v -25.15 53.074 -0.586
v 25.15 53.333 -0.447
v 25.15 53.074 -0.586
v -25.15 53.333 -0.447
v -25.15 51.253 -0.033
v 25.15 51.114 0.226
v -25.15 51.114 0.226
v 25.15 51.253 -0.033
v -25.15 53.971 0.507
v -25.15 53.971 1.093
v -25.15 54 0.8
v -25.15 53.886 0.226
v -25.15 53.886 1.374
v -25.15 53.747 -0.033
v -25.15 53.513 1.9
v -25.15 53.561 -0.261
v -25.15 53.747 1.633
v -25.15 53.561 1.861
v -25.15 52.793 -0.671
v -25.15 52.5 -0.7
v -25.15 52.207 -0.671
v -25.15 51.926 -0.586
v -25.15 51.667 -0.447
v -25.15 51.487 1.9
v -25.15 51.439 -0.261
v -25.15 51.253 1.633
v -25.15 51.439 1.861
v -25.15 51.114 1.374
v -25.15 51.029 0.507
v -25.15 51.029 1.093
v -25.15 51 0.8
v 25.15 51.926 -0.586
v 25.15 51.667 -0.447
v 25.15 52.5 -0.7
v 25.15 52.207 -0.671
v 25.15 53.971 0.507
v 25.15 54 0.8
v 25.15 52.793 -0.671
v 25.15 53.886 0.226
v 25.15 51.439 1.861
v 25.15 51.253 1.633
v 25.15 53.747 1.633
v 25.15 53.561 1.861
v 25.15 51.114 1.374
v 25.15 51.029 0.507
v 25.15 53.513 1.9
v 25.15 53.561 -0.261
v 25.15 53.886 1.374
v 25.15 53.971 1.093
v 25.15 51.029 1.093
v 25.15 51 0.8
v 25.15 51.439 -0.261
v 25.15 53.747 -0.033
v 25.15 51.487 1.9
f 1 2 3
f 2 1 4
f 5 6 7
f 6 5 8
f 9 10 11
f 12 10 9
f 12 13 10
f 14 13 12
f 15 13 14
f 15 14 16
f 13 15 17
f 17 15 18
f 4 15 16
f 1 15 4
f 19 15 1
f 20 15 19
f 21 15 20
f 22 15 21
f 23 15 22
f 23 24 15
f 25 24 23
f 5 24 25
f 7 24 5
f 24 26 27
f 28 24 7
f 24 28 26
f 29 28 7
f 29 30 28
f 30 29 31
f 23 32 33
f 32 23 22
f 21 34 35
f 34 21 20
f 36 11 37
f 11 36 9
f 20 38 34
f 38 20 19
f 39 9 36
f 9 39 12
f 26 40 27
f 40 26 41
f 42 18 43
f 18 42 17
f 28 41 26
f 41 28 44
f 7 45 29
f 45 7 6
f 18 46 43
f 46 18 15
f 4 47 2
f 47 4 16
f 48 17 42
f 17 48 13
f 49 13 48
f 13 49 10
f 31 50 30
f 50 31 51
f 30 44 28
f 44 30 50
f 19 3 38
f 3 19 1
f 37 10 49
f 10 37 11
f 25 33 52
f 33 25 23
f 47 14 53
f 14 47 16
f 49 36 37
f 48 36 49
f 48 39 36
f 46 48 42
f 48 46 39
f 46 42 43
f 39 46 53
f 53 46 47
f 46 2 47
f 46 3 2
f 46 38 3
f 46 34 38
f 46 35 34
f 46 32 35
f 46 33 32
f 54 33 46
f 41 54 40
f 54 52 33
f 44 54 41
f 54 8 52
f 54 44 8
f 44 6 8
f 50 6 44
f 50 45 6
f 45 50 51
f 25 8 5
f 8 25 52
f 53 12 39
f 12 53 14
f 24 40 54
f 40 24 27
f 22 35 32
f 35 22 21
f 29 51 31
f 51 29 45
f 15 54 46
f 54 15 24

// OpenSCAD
module rod(
    width = 50,
	deep = 30,
	height=7,
	belt = 35,
	hinge_deep = 5,
	wall = 1.6,
	gap = 0.3,
	hinge_hole = 3.3
){
    hinge_width = width;
	render(){
		intersection(){
		    translate([0,deep/2+belt+hinge_deep/2,wall/2]){
		        rotate(90, [0,1,0]){
		            cylinder(hinge_width+gap, d=hinge_hole-gap,center=true, $fn=32);
		        }
		    }    
			translate([0,0,-wall]){
				cube([width*100,deep*100,height],center=true);
			}
			
		}
	}
	
}

rod();
